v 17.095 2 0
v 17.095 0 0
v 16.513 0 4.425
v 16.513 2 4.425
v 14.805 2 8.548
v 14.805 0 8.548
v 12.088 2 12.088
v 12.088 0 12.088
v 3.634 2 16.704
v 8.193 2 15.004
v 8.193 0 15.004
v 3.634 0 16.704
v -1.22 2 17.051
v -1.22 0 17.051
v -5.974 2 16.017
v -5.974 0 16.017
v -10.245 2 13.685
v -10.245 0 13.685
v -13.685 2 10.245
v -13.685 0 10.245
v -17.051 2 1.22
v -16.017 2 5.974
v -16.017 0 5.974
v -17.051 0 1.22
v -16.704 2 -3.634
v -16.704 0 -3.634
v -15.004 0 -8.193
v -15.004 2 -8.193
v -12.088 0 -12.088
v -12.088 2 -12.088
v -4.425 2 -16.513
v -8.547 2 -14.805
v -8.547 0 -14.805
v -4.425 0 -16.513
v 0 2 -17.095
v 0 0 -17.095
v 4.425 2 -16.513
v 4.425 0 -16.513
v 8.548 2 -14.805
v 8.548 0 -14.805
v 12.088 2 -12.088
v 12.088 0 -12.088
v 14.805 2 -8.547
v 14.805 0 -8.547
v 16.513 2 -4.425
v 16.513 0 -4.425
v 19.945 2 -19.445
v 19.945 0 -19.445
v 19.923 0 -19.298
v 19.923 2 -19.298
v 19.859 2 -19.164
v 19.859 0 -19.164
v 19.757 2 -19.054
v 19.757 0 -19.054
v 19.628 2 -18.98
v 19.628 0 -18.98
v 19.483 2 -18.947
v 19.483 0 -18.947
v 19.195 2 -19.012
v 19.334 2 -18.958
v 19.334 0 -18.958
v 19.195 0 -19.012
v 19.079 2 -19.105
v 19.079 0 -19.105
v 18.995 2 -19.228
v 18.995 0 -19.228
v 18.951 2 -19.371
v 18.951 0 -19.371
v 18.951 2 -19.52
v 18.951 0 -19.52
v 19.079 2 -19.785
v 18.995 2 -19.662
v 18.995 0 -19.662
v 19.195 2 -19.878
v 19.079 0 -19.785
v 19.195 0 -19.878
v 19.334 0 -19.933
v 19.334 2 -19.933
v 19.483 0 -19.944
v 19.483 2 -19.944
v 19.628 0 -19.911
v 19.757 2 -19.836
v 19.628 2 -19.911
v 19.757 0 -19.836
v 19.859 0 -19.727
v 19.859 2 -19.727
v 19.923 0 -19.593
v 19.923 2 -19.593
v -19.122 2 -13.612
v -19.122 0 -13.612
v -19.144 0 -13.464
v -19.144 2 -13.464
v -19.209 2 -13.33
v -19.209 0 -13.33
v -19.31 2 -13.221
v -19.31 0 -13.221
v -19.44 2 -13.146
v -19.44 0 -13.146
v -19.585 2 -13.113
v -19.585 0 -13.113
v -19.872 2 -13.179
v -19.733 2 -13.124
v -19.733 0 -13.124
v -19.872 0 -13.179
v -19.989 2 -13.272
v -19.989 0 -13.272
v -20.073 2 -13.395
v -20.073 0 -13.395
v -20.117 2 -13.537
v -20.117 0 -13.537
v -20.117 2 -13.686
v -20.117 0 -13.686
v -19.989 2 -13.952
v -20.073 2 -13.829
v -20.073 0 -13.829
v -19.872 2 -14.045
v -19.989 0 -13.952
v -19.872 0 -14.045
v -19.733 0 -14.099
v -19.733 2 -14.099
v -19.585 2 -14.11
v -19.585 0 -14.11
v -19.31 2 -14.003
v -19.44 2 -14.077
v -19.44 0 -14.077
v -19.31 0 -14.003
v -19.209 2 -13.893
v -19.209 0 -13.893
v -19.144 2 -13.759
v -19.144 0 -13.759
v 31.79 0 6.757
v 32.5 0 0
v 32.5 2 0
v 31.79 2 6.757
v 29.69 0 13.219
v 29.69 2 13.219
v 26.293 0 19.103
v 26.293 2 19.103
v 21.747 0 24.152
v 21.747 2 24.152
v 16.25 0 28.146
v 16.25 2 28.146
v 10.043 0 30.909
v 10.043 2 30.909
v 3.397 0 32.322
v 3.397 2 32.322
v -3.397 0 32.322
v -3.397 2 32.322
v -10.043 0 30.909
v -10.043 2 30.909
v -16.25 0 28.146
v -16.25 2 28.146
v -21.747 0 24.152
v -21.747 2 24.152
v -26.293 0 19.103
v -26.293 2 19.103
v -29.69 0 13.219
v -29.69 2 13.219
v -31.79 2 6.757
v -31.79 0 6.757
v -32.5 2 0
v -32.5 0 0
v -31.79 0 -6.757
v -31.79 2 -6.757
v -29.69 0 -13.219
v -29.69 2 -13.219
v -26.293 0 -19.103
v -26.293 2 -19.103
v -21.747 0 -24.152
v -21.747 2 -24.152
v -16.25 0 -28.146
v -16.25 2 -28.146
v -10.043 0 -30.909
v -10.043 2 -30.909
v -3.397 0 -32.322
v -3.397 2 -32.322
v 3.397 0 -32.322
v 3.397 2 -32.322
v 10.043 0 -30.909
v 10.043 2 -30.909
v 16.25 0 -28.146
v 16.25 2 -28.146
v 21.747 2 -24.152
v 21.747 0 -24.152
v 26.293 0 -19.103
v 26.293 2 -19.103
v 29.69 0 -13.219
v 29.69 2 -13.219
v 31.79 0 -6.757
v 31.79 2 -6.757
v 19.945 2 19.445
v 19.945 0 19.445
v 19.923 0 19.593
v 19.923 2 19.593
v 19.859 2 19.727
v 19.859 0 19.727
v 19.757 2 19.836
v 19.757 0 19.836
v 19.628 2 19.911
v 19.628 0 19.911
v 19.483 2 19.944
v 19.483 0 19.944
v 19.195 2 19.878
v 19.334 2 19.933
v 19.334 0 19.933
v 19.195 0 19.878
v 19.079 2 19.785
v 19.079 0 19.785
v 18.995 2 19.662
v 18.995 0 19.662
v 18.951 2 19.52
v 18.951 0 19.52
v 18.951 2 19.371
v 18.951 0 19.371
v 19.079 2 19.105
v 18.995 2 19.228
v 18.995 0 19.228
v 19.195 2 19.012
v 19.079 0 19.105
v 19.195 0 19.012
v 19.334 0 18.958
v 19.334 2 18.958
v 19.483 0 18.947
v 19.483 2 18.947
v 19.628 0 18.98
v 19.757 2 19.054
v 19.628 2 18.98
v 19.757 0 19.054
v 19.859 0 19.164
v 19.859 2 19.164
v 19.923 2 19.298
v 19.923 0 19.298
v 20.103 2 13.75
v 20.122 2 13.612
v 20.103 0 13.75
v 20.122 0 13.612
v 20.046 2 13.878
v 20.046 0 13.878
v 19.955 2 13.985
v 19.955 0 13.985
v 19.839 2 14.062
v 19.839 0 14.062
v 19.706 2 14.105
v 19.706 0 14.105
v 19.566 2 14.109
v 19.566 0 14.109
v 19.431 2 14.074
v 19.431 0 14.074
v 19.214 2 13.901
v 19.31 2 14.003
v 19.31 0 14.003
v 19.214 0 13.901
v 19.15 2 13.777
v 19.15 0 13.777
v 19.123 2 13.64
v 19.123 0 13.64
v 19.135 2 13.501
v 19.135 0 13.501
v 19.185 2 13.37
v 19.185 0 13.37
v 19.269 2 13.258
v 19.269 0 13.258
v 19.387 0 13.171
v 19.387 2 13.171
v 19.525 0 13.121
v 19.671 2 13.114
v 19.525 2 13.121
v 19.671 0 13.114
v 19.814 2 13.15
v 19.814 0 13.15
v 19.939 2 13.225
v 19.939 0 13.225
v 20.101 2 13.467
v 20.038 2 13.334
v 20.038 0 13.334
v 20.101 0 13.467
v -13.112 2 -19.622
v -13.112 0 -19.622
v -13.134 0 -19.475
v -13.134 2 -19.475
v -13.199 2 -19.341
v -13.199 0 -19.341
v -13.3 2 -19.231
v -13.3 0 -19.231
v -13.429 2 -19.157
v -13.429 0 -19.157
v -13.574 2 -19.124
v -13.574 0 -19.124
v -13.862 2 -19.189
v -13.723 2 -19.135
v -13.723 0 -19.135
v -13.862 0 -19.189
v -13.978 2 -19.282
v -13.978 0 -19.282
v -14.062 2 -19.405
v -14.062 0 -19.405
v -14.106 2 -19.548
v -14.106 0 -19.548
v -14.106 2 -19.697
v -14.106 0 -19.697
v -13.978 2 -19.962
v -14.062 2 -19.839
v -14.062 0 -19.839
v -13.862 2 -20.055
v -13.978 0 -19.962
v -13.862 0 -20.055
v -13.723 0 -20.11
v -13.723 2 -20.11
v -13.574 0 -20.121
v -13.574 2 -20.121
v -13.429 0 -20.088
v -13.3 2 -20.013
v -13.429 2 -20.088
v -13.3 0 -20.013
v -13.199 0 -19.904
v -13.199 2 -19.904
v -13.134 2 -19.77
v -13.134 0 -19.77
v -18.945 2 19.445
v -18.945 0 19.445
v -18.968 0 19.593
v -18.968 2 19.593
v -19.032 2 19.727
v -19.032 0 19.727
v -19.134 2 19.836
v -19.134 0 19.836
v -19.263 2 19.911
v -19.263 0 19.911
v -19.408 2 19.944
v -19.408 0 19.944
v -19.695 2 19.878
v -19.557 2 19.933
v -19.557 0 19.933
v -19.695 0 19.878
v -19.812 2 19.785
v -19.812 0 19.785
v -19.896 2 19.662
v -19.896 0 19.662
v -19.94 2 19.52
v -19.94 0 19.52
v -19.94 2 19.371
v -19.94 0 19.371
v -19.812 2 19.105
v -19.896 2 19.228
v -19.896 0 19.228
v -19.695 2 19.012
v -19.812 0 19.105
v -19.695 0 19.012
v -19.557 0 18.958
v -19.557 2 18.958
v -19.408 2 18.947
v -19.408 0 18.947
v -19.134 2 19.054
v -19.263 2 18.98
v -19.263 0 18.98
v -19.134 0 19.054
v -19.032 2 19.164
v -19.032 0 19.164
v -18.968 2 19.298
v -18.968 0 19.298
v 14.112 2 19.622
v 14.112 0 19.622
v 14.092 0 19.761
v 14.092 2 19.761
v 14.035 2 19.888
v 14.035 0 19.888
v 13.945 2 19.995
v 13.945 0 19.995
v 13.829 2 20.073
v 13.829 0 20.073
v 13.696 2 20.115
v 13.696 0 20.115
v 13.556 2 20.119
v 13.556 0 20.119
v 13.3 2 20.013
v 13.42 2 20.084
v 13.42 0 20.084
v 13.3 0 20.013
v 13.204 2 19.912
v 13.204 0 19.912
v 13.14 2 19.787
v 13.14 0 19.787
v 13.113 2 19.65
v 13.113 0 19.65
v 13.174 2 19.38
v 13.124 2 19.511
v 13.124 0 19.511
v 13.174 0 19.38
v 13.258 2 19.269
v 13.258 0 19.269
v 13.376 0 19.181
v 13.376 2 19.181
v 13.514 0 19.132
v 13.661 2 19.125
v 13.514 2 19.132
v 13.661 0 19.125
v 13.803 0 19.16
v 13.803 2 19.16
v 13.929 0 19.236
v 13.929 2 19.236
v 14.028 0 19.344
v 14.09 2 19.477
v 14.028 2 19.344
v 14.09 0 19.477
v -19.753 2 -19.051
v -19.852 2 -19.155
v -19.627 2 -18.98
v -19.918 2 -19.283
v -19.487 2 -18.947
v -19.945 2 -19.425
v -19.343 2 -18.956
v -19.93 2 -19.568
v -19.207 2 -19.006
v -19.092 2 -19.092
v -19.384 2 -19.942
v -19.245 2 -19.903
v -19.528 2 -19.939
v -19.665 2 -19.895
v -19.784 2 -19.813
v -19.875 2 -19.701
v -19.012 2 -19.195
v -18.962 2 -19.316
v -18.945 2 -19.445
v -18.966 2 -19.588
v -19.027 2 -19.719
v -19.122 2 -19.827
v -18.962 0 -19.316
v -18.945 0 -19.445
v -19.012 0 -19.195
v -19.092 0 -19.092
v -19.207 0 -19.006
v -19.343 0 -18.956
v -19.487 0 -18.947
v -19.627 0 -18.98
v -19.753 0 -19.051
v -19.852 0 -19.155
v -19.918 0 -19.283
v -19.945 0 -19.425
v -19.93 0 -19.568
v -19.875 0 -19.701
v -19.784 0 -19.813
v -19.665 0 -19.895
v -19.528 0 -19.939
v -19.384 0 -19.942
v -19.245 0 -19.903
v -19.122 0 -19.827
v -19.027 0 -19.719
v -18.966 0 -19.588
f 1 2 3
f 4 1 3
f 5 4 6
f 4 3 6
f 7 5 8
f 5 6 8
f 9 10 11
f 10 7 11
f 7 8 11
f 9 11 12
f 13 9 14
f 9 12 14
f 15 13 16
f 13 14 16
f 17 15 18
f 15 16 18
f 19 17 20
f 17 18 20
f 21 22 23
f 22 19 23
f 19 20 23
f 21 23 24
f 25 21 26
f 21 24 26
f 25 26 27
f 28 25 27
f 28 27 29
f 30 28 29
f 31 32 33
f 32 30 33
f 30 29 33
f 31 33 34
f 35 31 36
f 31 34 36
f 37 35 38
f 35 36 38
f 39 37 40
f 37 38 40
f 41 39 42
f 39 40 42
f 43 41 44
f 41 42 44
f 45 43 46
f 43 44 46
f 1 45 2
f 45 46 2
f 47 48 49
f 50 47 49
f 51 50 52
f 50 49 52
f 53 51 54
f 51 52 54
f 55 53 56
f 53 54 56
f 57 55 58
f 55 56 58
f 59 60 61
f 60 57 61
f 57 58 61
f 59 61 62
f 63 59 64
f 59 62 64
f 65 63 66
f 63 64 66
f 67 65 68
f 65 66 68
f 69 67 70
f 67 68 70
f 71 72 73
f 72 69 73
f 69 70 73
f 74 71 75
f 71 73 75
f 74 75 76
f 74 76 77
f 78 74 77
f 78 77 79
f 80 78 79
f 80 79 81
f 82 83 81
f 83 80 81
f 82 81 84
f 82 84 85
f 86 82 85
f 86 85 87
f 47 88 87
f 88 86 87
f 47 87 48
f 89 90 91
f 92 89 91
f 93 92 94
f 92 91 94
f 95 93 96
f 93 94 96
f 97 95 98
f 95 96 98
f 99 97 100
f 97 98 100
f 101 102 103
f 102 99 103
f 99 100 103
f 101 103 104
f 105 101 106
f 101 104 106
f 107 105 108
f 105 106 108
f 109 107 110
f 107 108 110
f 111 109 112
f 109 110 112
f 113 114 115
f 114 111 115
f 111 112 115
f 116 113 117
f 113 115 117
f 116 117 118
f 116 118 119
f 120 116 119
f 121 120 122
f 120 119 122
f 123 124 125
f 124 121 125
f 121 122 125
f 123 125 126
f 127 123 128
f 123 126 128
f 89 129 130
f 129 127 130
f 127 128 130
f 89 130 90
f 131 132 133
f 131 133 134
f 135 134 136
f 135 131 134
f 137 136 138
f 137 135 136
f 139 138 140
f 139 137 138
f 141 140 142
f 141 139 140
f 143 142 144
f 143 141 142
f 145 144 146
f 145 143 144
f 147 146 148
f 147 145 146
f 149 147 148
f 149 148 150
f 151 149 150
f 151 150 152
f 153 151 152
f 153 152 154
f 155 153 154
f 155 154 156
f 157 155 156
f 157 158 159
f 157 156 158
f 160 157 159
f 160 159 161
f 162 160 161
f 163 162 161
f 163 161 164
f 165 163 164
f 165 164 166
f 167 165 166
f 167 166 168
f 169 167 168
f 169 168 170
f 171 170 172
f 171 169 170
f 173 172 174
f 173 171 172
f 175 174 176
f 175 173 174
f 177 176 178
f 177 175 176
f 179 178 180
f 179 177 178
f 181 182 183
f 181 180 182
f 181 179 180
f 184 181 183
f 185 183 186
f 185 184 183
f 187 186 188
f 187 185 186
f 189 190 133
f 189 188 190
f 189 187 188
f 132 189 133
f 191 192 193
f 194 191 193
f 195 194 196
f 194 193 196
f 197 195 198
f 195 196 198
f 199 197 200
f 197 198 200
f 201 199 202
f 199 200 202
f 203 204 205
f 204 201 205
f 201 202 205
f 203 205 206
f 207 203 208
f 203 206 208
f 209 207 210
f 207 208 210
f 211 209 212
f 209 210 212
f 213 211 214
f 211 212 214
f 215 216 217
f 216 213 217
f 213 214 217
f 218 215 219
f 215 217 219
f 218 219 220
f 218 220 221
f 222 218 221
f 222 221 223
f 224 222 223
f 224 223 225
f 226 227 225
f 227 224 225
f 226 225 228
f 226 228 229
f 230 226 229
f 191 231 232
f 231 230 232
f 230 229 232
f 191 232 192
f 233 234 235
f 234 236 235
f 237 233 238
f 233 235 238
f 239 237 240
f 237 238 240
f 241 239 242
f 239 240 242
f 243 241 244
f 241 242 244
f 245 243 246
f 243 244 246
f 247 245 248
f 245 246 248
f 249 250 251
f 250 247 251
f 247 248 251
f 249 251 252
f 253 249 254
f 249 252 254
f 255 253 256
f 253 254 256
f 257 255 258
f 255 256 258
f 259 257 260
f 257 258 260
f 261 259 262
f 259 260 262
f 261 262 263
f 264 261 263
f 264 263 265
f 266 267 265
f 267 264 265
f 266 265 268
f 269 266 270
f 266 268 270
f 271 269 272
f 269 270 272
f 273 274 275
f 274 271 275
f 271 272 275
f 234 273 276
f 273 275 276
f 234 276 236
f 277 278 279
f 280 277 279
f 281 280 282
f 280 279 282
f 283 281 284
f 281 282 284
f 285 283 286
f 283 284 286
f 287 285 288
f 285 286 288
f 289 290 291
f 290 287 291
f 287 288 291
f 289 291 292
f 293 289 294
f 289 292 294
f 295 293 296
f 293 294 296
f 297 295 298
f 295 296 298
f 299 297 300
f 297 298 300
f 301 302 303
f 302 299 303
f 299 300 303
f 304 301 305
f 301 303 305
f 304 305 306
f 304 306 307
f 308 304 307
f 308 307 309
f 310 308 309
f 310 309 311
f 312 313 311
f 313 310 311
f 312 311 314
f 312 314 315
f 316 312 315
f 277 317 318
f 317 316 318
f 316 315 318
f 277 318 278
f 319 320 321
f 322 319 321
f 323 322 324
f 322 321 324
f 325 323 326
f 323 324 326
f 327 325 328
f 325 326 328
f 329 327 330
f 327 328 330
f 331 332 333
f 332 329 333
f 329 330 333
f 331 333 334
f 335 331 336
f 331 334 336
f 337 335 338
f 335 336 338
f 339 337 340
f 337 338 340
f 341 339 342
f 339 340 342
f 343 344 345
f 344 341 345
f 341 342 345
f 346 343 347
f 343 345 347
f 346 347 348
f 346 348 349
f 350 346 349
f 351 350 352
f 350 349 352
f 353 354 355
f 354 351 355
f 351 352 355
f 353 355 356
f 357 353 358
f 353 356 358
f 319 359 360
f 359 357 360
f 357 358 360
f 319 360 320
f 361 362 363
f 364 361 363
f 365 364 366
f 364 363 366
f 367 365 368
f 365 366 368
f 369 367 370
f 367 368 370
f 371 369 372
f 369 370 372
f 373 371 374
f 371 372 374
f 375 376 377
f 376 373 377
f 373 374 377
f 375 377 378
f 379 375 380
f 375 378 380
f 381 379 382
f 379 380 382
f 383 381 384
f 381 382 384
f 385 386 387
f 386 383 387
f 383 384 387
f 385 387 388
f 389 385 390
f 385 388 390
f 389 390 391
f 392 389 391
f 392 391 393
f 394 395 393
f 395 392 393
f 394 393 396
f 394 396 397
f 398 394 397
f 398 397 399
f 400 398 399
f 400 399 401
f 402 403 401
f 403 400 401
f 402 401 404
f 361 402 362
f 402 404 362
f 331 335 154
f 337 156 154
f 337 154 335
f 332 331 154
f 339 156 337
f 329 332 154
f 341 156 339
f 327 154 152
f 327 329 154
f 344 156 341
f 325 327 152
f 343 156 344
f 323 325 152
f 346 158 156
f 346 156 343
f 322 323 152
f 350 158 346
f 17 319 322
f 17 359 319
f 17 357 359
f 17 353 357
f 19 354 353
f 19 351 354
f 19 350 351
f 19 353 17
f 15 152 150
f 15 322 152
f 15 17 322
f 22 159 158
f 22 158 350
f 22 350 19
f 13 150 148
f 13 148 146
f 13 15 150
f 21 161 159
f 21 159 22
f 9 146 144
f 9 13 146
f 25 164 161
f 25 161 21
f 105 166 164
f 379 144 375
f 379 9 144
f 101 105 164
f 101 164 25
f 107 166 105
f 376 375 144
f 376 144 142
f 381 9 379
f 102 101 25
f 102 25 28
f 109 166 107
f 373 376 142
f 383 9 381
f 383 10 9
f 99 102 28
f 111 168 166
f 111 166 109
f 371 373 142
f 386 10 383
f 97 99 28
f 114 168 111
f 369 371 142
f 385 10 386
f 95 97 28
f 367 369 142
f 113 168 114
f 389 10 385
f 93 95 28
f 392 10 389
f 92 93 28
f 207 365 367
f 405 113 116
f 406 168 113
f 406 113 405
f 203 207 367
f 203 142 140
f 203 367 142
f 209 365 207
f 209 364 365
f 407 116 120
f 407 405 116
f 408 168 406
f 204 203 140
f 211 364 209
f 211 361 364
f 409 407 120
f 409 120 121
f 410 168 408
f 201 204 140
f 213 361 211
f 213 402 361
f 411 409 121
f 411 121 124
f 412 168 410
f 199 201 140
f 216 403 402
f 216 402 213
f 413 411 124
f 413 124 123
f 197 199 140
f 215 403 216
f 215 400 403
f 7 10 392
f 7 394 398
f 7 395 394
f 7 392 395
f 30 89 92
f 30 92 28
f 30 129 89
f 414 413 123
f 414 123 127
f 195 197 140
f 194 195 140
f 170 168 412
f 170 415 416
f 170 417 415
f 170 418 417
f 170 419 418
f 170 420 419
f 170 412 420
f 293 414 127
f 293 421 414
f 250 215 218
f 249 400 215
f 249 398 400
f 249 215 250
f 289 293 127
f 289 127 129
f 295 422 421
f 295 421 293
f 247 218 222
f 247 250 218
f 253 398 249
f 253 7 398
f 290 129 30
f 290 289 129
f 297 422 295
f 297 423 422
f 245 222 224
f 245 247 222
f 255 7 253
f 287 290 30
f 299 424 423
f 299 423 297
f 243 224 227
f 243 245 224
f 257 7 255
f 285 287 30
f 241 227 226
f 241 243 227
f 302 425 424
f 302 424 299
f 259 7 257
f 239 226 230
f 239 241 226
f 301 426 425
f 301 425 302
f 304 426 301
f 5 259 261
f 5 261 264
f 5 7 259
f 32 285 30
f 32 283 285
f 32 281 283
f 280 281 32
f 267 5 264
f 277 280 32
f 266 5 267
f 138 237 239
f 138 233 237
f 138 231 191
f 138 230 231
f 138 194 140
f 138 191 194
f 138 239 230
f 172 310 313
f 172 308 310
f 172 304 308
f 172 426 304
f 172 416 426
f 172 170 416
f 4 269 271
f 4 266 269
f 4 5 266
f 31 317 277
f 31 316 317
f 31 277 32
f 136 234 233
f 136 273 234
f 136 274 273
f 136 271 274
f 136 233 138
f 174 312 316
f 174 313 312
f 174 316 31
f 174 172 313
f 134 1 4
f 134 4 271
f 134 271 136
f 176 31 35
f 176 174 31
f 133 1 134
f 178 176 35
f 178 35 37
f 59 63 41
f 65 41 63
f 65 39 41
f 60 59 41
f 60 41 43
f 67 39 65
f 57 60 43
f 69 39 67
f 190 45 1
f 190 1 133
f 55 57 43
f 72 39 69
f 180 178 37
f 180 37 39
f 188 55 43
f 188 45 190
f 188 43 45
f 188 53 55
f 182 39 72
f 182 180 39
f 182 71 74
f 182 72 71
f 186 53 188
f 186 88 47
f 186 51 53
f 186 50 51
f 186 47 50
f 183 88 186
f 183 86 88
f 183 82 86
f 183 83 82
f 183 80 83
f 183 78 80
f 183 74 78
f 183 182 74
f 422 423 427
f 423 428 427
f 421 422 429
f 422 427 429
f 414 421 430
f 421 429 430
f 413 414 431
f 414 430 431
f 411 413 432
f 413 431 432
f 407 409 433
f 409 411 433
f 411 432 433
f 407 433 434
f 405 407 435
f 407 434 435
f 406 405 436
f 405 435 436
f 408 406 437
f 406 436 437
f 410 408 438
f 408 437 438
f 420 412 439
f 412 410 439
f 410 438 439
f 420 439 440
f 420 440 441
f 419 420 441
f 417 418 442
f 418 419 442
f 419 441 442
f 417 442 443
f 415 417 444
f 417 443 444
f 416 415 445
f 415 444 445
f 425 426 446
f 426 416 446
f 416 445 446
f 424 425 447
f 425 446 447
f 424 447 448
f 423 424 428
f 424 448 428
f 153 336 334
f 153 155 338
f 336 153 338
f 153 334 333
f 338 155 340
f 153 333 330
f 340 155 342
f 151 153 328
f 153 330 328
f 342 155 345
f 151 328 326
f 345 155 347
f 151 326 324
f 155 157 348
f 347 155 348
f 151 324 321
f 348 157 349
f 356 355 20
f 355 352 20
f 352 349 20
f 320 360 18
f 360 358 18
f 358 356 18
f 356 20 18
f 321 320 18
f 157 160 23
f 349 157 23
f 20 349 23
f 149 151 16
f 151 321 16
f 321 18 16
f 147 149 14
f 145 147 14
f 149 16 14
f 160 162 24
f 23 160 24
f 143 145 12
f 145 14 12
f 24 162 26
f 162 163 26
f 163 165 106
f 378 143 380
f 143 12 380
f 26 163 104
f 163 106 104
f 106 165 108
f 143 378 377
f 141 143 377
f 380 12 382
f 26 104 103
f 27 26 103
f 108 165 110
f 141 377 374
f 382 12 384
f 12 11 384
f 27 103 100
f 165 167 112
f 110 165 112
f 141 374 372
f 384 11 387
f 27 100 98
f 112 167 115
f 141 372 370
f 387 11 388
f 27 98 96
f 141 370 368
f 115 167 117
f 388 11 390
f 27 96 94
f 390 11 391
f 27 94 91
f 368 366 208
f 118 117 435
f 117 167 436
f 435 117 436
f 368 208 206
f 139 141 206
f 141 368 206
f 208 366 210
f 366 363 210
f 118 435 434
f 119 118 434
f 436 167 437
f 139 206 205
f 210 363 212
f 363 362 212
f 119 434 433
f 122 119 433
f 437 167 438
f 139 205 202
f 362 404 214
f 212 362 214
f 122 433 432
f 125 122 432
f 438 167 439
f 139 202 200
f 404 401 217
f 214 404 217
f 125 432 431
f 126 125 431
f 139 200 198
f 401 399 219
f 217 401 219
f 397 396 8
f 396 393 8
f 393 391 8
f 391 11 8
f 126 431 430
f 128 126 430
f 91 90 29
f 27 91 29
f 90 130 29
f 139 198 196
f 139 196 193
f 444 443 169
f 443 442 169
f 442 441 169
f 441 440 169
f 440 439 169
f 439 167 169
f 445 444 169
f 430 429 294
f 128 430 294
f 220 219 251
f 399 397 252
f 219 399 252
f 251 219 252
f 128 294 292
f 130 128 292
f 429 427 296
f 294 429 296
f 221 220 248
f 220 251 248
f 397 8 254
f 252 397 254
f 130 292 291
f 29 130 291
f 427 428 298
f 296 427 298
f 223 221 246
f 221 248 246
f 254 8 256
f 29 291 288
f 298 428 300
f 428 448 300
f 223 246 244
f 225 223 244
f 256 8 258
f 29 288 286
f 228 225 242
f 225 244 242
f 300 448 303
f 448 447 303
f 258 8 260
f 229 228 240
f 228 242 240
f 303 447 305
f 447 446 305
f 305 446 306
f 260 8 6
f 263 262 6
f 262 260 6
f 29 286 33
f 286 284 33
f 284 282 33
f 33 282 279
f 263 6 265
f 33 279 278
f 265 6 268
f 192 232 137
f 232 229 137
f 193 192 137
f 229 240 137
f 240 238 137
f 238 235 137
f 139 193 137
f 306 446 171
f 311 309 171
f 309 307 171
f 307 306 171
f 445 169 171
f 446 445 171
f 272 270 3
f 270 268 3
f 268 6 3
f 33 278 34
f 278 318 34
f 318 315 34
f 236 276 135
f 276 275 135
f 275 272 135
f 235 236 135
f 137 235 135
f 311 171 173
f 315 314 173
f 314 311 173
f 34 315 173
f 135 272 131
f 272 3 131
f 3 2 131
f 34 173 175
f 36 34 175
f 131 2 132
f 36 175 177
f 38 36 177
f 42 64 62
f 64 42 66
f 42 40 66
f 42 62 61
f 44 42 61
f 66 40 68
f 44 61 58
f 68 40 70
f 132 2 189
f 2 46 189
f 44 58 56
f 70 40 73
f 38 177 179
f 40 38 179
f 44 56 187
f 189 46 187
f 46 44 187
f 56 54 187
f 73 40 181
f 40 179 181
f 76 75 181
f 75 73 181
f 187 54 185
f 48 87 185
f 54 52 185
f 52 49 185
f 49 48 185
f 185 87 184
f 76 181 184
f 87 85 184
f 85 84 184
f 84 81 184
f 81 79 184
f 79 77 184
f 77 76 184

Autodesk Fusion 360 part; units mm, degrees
sketch "Sketch1" plane through (0, 0, 0) normal (0, 1, 0) x (1, 0, 0)
  circle A0 centre (0, 0) radius 17.095
  circle A1 centre (0, 0) radius 32.5
  line L0 (-21.05, 0) -> (0, 0)
  line L1 (0, 0) -> (-19.4454, 19.4454)
  circle A2 centre (-19.4454, 19.4454) radius 0.5
  circle A3 centre (-19.4454, -19.4454) radius 0.5
  circle A4 centre (19.4454, -19.4454) radius 0.5
  circle A5 centre (19.4454, 19.4454) radius 0.5
  line L2 (17.3241, -8.1317) -> (8.1317, -17.3241)
  line L3 (0, 0) -> (12.7279, -12.7279)
  line L4 (10.253, -19.4454) -> (8.1317, -17.3241)
  line L5 (8.1317, -17.3241) -> (11.3137, -14.1421)
  line L6 (11.3137, -14.1421) -> (13.435, -16.2635)
  line L7 (13.435, -16.2635) -> (10.253, -19.4454)
  line L8 (19.4454, -10.253) -> (17.3241, -8.1317)
  line L9 (17.3241, -8.1317) -> (14.1421, -11.3137)
  line L10 (14.1421, -11.3137) -> (16.2635, -13.435)
  line L11 (16.2635, -13.435) -> (19.4454, -10.253)
  line L12 (11.844, -17.8544) -> (13.6118, -19.6222)
  circle A6 centre (13.6118, -19.6222) radius 0.5
  line L13 (17.8544, -11.844) -> (19.6222, -13.6118)
  circle A7 centre (19.6222, -13.6118) radius 0.5
  circle A8 centre (-13.6118, 19.6222) radius 0.5
  circle A9 centre (-19.6222, 13.6118) radius 0.5
  dimension "d1" = 34.19
  dimension "d4" = 21.05
  dimension "d7" = 27.5
  dimension "d8" = 1
  dimension "d9" = 45
  dimension "d13" = 13
  dimension "d14" = 18
  dimension "d15" = 3
  dimension "d16" = 4.5
  dimension "d18" = 4.5
  dimension "d19" = 2.5
  dimension "d20" = 1
  dimension "d21" = 2.5
  dimension "d22" = 1
  dimension "d24" = 360
  dimension "d27" = 65
extrude "Extrude1" add sketch "Sketch1" along normal blind 2 contours L2 L8 L9 L10 L11 | L2 L4 L5 L6 L7 | A1
